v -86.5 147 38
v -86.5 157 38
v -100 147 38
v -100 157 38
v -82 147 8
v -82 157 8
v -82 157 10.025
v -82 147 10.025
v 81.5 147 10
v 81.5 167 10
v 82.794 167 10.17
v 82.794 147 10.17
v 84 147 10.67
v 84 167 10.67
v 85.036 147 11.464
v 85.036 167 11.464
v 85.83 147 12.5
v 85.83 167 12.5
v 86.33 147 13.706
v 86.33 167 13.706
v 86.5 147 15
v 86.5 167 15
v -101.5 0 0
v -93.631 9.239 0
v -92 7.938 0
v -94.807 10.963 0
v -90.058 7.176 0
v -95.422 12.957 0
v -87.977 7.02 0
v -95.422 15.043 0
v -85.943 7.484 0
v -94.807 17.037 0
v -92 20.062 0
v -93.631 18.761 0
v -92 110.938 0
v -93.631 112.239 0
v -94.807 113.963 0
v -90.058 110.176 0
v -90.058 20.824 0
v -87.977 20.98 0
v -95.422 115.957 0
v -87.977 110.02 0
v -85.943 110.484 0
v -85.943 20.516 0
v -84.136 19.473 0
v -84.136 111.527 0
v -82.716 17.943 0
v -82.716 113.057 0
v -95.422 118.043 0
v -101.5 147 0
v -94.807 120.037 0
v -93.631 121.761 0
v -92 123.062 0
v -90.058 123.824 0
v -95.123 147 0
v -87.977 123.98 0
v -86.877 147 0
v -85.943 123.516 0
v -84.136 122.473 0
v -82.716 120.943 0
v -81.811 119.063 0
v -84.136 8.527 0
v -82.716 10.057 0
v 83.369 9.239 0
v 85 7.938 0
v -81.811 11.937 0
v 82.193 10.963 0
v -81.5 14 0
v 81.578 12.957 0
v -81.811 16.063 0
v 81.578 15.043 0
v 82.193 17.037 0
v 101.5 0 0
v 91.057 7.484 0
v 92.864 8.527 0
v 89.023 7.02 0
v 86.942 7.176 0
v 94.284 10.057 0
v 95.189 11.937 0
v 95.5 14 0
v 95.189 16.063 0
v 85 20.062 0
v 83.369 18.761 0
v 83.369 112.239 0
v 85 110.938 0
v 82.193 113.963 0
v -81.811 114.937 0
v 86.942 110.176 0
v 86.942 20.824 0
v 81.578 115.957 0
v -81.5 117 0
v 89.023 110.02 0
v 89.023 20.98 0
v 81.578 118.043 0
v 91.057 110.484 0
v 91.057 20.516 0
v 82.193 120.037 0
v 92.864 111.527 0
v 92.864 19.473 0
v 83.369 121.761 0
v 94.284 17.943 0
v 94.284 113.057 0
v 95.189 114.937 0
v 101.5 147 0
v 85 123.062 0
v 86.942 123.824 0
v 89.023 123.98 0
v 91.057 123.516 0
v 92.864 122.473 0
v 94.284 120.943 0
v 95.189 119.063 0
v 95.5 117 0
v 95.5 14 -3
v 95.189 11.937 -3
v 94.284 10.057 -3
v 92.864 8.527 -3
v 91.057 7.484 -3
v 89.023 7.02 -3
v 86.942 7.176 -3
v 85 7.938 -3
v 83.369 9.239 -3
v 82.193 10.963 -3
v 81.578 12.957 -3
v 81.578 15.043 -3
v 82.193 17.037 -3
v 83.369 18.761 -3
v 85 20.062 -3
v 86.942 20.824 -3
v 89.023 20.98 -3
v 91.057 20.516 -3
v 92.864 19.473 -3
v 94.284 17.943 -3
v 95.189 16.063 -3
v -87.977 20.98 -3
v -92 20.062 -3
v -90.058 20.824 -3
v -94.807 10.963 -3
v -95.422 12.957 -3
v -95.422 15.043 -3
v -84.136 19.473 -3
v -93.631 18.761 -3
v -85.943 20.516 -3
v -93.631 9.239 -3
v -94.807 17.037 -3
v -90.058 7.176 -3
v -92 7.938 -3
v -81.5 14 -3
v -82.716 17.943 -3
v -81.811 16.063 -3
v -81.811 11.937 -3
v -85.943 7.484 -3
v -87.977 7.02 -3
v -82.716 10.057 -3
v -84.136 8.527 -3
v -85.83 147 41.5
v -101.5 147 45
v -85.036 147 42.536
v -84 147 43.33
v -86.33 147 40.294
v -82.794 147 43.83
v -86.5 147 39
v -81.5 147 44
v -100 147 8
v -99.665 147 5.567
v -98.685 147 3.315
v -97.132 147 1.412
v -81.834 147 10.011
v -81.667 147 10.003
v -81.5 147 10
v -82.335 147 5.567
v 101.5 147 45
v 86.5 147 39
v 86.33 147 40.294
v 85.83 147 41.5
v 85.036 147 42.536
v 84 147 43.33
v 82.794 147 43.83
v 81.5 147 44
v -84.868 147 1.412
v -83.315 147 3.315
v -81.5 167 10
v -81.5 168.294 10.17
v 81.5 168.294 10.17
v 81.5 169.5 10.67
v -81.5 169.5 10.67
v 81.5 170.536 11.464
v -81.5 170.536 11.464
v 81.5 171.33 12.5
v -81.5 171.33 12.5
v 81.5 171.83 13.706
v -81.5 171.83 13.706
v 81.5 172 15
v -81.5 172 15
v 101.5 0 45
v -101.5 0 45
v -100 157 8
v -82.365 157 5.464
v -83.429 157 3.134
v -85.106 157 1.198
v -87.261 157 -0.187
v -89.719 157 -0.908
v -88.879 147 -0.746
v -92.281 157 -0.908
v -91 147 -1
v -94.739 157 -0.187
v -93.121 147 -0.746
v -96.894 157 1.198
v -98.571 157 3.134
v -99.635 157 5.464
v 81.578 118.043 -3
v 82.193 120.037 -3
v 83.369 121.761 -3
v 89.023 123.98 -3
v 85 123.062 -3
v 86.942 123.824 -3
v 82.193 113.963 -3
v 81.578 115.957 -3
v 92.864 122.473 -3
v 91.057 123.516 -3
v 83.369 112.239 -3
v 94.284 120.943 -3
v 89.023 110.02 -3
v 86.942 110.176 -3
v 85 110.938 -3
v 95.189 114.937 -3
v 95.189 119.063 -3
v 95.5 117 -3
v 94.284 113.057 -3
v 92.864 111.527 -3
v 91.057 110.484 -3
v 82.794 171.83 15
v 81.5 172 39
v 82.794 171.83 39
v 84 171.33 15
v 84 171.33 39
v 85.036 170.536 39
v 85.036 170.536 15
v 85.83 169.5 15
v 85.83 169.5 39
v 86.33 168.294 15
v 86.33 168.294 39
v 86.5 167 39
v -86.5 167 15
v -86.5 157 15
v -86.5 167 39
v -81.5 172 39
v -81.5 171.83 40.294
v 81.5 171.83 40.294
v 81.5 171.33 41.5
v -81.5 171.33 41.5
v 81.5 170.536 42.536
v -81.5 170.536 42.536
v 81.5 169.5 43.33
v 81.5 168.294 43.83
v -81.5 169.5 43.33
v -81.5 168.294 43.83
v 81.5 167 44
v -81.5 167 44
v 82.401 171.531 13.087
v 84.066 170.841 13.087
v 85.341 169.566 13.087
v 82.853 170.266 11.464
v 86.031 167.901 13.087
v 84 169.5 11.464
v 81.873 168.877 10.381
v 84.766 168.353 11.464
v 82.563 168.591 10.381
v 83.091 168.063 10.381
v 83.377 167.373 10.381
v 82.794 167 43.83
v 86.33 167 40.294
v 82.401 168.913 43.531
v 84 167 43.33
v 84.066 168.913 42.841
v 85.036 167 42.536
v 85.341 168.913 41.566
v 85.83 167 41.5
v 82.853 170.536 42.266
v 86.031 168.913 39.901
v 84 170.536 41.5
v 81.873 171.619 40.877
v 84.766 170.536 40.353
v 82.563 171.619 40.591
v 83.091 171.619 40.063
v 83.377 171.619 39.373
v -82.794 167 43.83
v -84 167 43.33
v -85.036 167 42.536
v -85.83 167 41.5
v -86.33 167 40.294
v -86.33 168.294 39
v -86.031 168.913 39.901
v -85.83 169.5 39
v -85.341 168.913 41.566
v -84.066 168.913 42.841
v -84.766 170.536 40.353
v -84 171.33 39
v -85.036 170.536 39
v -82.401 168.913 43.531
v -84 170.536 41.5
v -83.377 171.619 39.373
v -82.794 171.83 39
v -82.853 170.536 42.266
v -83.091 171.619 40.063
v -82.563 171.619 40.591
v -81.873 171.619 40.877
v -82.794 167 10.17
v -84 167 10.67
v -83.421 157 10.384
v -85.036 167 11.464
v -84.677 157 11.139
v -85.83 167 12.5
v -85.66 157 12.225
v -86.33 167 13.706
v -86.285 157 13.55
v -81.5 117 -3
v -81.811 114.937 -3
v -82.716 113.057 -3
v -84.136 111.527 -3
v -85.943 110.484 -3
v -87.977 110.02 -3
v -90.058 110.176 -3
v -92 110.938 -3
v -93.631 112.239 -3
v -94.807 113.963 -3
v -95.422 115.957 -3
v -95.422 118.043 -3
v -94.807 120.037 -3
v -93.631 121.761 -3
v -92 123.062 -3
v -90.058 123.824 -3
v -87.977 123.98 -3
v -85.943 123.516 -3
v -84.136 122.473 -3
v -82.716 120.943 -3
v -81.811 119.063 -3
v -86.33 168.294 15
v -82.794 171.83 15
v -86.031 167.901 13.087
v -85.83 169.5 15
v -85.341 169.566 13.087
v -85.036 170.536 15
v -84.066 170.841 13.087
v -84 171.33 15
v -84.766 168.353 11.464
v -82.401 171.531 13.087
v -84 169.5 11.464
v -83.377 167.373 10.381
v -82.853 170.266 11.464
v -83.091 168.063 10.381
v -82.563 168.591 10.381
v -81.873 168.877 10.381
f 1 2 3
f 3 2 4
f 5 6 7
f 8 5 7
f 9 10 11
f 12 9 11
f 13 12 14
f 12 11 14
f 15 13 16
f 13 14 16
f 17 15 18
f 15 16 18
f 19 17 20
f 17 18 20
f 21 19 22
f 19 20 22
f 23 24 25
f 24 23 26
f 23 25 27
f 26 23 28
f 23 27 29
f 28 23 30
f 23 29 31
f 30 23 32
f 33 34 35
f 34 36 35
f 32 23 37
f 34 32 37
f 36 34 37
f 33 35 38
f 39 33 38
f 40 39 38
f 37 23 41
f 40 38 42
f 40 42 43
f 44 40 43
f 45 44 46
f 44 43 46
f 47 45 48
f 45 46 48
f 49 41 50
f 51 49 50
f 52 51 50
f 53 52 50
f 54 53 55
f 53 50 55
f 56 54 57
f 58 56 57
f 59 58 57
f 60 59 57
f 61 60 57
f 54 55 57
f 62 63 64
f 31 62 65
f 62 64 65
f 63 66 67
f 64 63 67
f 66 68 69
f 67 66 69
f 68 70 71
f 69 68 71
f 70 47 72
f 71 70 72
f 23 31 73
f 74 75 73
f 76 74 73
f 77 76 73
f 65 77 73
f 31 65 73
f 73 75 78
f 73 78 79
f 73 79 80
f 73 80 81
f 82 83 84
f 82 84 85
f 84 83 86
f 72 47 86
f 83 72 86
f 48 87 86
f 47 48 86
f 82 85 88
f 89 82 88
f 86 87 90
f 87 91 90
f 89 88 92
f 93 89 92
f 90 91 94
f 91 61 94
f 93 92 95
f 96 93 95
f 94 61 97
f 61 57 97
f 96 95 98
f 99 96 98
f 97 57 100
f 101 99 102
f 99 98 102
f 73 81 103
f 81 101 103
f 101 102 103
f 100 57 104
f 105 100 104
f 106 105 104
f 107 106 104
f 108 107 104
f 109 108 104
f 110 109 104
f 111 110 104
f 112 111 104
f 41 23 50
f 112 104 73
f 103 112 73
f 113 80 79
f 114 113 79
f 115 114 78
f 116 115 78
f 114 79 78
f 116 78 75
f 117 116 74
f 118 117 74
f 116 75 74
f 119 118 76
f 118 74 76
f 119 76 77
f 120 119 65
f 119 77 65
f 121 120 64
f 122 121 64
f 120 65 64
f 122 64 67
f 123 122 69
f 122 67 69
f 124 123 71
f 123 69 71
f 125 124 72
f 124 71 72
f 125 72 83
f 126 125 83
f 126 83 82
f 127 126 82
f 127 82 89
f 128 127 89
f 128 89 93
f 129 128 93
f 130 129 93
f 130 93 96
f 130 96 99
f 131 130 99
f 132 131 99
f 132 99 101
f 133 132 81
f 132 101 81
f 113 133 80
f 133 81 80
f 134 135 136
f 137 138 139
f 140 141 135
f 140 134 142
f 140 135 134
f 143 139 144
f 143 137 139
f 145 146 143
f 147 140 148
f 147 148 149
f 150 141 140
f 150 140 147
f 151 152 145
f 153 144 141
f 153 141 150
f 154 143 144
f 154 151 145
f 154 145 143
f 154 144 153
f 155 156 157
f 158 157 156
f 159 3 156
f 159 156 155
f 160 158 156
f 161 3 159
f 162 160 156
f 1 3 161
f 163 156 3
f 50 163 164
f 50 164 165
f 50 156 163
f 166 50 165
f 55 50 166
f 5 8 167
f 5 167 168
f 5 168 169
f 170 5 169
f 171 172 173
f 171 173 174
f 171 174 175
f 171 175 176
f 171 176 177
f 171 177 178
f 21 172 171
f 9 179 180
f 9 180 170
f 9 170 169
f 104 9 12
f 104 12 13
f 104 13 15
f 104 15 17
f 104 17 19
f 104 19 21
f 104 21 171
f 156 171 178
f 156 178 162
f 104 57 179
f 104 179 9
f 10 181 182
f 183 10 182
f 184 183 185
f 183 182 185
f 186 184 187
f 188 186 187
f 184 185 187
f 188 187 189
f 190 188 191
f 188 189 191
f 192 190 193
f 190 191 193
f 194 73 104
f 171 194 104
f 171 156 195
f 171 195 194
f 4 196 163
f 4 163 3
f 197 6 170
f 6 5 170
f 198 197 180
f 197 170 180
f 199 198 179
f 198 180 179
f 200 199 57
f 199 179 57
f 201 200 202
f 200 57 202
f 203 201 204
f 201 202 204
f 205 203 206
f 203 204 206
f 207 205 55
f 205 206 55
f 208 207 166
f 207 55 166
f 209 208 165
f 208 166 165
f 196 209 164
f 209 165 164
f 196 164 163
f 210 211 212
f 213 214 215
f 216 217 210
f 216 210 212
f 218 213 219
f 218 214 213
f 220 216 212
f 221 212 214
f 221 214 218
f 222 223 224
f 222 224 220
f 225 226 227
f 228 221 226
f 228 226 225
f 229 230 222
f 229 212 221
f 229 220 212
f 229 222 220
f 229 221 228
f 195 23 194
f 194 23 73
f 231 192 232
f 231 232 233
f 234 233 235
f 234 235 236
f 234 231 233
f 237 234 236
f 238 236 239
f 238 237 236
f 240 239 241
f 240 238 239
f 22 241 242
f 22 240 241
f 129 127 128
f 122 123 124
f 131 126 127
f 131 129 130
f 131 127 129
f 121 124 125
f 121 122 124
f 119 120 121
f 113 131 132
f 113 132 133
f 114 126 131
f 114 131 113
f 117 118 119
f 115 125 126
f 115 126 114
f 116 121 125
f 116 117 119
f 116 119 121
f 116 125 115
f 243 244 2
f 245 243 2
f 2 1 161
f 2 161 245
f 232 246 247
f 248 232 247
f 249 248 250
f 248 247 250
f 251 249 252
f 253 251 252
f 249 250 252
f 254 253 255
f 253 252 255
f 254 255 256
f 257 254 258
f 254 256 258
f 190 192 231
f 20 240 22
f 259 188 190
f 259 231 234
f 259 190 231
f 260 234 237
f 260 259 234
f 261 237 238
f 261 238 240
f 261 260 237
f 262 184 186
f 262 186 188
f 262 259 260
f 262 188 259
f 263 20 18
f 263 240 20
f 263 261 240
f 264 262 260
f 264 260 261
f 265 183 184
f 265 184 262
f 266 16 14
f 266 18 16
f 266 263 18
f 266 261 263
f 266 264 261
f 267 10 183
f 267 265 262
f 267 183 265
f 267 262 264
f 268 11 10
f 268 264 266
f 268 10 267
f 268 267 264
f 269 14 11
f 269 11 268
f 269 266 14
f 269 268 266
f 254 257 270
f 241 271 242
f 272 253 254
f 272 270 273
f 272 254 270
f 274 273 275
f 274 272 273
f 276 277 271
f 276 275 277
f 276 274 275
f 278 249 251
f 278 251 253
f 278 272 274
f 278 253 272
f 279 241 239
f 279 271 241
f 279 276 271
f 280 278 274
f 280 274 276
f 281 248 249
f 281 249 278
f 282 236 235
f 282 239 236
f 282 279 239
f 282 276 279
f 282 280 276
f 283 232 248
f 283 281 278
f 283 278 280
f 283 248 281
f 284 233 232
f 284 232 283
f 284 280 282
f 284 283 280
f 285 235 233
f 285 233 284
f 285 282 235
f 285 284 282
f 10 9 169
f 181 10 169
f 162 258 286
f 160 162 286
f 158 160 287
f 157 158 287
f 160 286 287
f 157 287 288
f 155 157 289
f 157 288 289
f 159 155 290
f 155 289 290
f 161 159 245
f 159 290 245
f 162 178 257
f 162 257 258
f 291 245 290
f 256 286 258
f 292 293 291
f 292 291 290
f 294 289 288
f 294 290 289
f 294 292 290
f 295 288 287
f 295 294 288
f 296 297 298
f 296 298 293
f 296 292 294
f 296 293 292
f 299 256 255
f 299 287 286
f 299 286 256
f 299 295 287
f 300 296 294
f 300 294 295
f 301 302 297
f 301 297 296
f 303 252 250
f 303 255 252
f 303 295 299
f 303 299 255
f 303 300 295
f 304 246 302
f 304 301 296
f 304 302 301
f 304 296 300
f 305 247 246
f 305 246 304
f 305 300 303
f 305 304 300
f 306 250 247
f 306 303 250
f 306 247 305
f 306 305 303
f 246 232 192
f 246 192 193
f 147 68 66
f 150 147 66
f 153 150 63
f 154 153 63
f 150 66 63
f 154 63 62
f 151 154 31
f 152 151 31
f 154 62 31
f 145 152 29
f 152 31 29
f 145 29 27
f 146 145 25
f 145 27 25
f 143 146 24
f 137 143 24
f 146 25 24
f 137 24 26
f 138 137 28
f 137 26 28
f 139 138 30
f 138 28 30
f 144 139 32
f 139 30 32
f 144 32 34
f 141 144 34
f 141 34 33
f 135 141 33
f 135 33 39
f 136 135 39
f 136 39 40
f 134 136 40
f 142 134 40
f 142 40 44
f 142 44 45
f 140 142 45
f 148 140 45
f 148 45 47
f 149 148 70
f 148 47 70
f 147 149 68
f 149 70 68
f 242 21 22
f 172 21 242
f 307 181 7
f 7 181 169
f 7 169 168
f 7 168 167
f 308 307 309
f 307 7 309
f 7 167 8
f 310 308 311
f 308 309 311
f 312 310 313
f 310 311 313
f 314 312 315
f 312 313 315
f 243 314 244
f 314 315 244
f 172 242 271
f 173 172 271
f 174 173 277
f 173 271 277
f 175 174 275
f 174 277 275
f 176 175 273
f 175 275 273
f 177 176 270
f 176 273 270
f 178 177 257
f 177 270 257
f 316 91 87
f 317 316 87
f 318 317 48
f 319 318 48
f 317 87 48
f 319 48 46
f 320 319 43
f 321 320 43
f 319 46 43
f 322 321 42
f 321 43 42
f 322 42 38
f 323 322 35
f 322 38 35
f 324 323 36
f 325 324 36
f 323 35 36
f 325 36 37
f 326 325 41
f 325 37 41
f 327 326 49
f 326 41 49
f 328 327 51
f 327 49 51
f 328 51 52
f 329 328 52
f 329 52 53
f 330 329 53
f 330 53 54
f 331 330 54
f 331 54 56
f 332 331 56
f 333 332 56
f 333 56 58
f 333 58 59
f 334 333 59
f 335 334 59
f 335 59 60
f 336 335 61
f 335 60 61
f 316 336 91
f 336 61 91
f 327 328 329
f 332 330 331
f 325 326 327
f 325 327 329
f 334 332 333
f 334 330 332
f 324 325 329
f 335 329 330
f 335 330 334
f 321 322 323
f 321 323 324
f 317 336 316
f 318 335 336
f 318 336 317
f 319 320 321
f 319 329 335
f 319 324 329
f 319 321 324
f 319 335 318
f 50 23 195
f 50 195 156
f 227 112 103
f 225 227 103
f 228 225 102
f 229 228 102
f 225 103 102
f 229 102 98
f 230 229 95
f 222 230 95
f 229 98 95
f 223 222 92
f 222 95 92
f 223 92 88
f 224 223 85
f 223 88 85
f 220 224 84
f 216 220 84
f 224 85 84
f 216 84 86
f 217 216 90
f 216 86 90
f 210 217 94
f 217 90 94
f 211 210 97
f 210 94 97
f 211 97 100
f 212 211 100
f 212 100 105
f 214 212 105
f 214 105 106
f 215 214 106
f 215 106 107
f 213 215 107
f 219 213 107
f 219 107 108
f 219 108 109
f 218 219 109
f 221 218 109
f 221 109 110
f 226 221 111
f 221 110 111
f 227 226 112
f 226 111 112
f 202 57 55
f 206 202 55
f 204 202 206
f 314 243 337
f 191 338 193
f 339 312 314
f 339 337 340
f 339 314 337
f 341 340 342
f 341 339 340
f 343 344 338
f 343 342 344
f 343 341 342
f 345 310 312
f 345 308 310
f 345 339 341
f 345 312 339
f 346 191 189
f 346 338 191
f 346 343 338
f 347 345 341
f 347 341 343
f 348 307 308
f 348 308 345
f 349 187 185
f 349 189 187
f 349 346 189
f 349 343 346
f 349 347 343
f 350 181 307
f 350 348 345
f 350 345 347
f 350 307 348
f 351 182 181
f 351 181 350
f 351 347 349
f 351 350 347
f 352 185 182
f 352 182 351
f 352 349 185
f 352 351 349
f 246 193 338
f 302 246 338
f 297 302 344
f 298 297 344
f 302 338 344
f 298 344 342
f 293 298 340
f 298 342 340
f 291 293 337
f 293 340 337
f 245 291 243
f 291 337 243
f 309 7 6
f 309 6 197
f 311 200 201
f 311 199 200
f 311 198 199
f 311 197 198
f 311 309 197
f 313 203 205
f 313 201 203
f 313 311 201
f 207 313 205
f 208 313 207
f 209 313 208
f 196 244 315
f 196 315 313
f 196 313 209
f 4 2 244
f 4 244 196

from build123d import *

# Parameters (mm, degrees)
F0_W         = 203
F0_H         = 147
F1_DEPTH     = 45
F2_R         = 7
F3_DEPTH     = 3
F4_R         = 9
F5_DEPTH     = 10
F6_W         = 173
F6_H         = 34
F7_DEPTH     = 25
F8_T1_DEPTH  = 163
F8_T3_DEPTH  = 24
F8_T5_DEPTH  = 20
F8_S9_W      = 5
F8_S9_H      = 5
F8_T10_DEPTH = 5
F8_S15_W     = 5
F8_S15_H     = 5
F8_T16_DEPTH = 5
F8_S21_W     = 5
F8_S21_H     = 5
F8_T22_DEPTH = 5
F8_S27_W     = 5
F8_S27_H     = 5
F8_T28_DEPTH = 5
F8_T34_DEPTH = 22.5
F8_S36_R     = 9
F8_T37_DEPTH = 13
F8_T42_DEPTH = 10
F8_S43_R     = 9
F8_T44_DEPTH = 8
F8_T48_DEPTH = 10
F8_S49_R     = 9
F8_T50_DEPTH = 8
F9_W         = 18
F9_H         = 30
F10_DEPTH    = 10


# Not quite as in the source:
# - a fillet or chamfer that OpenCascade refuses, or shapes differently, is made with other operations: its cross-section is extruded or revolved along the edge and cut away or added


with BuildPart() as f1:
    # F0 (on Top) → F1 (new body)
    with BuildSketch(Plane.XY):
        with Locations((0, 73.5)):
            Rectangle(F0_W, F0_H)
    extrude(amount=F1_DEPTH)

    # F2 (on face) → F3 (join)
    with BuildSketch(Plane(origin=(0, 0, 0), x_dir=(1, 0, 0), z_dir=(0, 0, -1))):
        with Locations((-88.5, -14)):
            Circle(F2_R)
        with Locations((-88.5, -117)):
            Circle(F2_R)
        with Locations((88.5, -14)):
            Circle(F2_R)
        with Locations((88.5, -117)):
            Circle(F2_R)
    extrude(amount=F3_DEPTH)

    # F4 (on face) → F5 (join)
    with BuildSketch(Plane(origin=(0, 147, 0), x_dir=(-1, 0, 0), z_dir=(0, 1, 0))):
        with Locations((91, 8)):
            Circle(F4_R)
    extrude(amount=F5_DEPTH)

    # F6 (on face) → F7 (join)
    with BuildSketch(Plane(origin=(0, 147, 0), x_dir=(-1, 0, 0), z_dir=(0, 1, 0))):
        with Locations((0, 27)):
            Rectangle(F6_W, F6_H)
    extrude(amount=F7_DEPTH)

    # F8: fillet of radius 5 on 8 edges, made by hand

    # F8_s2 → F8_t1 (cut)
    with BuildSketch(Plane.YZ.offset(-81.5)):
        with BuildLine():
            ThreePointArc((172, 39), (170.5355339059, 42.5355339059), (167, 44))
            Line((167, 44), (172, 44))
            Line((172, 44), (172, 39))
        make_face()
        with BuildLine():
            ThreePointArc((167, 10), (170.5355339059, 11.4644660941), (172, 15))
            Line((172, 15), (172, 10))
            Line((172, 10), (167, 10))
        make_face()
    extrude(amount=F8_T1_DEPTH, mode=Mode.SUBTRACT)

    # F8_s4 → F8_t3 (cut)
    with BuildSketch(Plane.XY.offset(15)):
        with BuildLine():
            ThreePointArc((81.5, 172), (85.0355339059, 170.5355339059), (86.5, 167))
            Line((86.5, 167), (86.5, 172))
            Line((86.5, 172), (81.5, 172))
        make_face()
        with BuildLine():
            ThreePointArc((-81.5, 172), (-85.0355339059, 170.5355339059), (-86.5, 167))
            Line((-86.5, 167), (-86.5, 172))
            Line((-86.5, 172), (-81.5, 172))
        make_face()
    extrude(amount=F8_T3_DEPTH, mode=Mode.SUBTRACT)

    # F8_s6 → F8_t5 (cut)
    with BuildSketch(Plane.XZ.offset(-167)):
        with BuildLine():
            ThreePointArc((86.5, 39), (85.0355339059, 42.5355339059), (81.5, 44))
            Line((81.5, 44), (86.5, 44))
            Line((86.5, 44), (86.5, 39))
        make_face()
        with BuildLine():
            ThreePointArc((81.5, 10), (85.0355339059, 11.4644660941), (86.5, 15))
            Line((86.5, 15), (86.5, 10))
            Line((86.5, 10), (81.5, 10))
        make_face()
        with BuildLine():
            ThreePointArc((-81.5, 44), (-85.0355339059, 42.5355339059), (-86.5, 39))
            Line((-86.5, 39), (-86.5, 44))
            Line((-86.5, 44), (-81.5, 44))
        make_face()
    extrude(amount=F8_T5_DEPTH, mode=Mode.SUBTRACT)


with BuildPart() as f8_tool8:
    # F8_s9 → F8_t10 (new body)
    with BuildSketch(Plane.XZ.offset(-167)):
        with Locations((-84, 41.5)):
            Rectangle(F8_S9_W, F8_S9_H)
    extrude(amount=-F8_T10_DEPTH)

    # F8_s11 → F8_t12 (revolve, cut)
    with BuildSketch(Plane(origin=(-81.5, 167, 39), x_dir=(0.7071067812, 0, -0.7071067812), z_dir=(0.7071067812, 0, 0.7071067812))):
        with BuildLine():
            ThreePointArc((0, -5), (5, 0), (0, 5))
            Line((0, 5), (0, -5))
        make_face()
    revolve(axis=Axis((-81.5, 167, 39), (0, 1, 0)), mode=Mode.SUBTRACT)


with BuildPart() as f1_1:
    add(f1.part)

    # F8_t7: cut F8_tool8
    add(f8_tool8.part, mode=Mode.SUBTRACT)


with BuildPart() as f8_tool14:
    # F8_s15 → F8_t16 (new body)
    with BuildSketch(Plane.XZ.offset(-167)):
        with Locations((84, 41.5)):
            Rectangle(F8_S15_W, F8_S15_H)
    extrude(amount=-F8_T16_DEPTH)

    # F8_s17 → F8_t18 (revolve, cut)
    with BuildSketch(Plane(origin=(81.5, 167, 39), x_dir=(-0.7071067812, 0, -0.7071067812), z_dir=(0.7071067812, 0, -0.7071067812))):
        with BuildLine():
            ThreePointArc((0, -5), (5, 0), (0, 5))
            Line((0, 5), (0, -5))
        make_face()
    revolve(axis=Axis((81.5, 167, 39), (0, 1, 0)), mode=Mode.SUBTRACT)


with BuildPart() as f1_2:
    add(f1_1.part)

    # F8_t13: cut F8_tool14
    add(f8_tool14.part, mode=Mode.SUBTRACT)


with BuildPart() as f8_tool20:
    # F8_s21 → F8_t22 (new body)
    with BuildSketch(Plane.XY.offset(15)):
        with Locations((84, 169.5)):
            Rectangle(F8_S21_W, F8_S21_H)
    extrude(amount=-F8_T22_DEPTH)

    # F8_s23 → F8_t24 (revolve, cut)
    with BuildSketch(Plane(origin=(81.5, 167, 15), x_dir=(-0.7071067812, -0.7071067812, 0), z_dir=(0.7071067812, -0.7071067812, 0))):
        with BuildLine():
            ThreePointArc((0, -5), (5, 0), (0, 5))
            Line((0, 5), (0, -5))
        make_face()
    revolve(axis=Axis((81.5, 167, 15), (0, 0, -1)), mode=Mode.SUBTRACT)


with BuildPart() as f1_3:
    add(f1_2.part)

    # F8_t19: cut F8_tool20
    add(f8_tool20.part, mode=Mode.SUBTRACT)


with BuildPart() as f8_tool26:
    # F8_s27 → F8_t28 (new body)
    with BuildSketch(Plane.XY.offset(15)):
        with Locations((-84, 169.5)):
            Rectangle(F8_S27_W, F8_S27_H)
    extrude(amount=-F8_T28_DEPTH)

    # F8_s29 → F8_t30 (revolve, cut)
    with BuildSketch(Plane(origin=(-81.5, 167, 15), x_dir=(0.7071067812, -0.7071067812, 0), z_dir=(0.7071067812, 0.7071067812, 0))):
        with BuildLine():
            ThreePointArc((0, -5), (5, 0), (0, 5))
            Line((0, 5), (0, -5))
        make_face()
    revolve(axis=Axis((-81.5, 167, 15), (0, 0, -1)), mode=Mode.SUBTRACT)


with BuildPart() as f1_4:
    add(f1_3.part)

    # F8_t25: cut F8_tool26
    add(f8_tool26.part, mode=Mode.SUBTRACT)


with BuildPart() as f8_tool32:
    # F8_s33 → F8_t34 (new body)
    with BuildSketch(Plane.XZ.offset(-144.5)):
        with BuildLine():
            ThreePointArc((-81.5, 10), (-85.0355339059, 11.4644660941), (-86.5, 15))
            Line((-86.5, 15), (-86.5, 10))
            Line((-86.5, 10), (-81.5, 10))
        make_face()
    extrude(amount=-F8_T34_DEPTH)

    split(bisect_by=Plane.XZ.offset(-147), keep=Keep.BOTTOM)

    # F8_s36 → F8_t37 (cut, symmetric)
    with BuildSketch(Plane.XZ.offset(-155.8)):
        with Locations((-91, 8)):
            Circle(F8_S36_R)
    extrude(amount=F8_T37_DEPTH, both=True, mode=Mode.SUBTRACT)

    split(bisect_by=Plane.XZ.offset(-157), keep=Keep.TOP)


with BuildPart() as f1_5:
    add(f1_4.part)

    # F8_t31: cut F8_tool32
    add(f8_tool32.part, mode=Mode.SUBTRACT)


with BuildPart() as f8_tool40:
    # F8_s41 → F8_t42 (new body)
    with BuildSketch(Plane.XZ.offset(-157)):
        with BuildLine():
            ThreePointArc((-81.5, 10), (-85.0355339059, 11.4644660941), (-86.5, 15))
            Line((-86.5, 15), (-86.5, 10))
            Line((-86.5, 10), (-81.5, 10))
        make_face()
    extrude(amount=-F8_T42_DEPTH)

    # F8_s43 → F8_t44 (cut, symmetric)
    with BuildSketch(Plane.XZ.offset(-162)):
        with Locations((-91, 8)):
            Circle(F8_S43_R)
    extrude(amount=F8_T44_DEPTH, both=True, mode=Mode.SUBTRACT)


with BuildPart() as f1_6:
    add(f1_5.part)

    # F8_t39: cut F8_tool40
    add(f8_tool40.part, mode=Mode.SUBTRACT)


with BuildPart() as f8_tool46:
    # F8_s47 → F8_t48 (new body)
    with BuildSketch(Plane.XZ.offset(-157)):
        with BuildLine():
            ThreePointArc((-81.5, 10), (-85.0355339059, 11.4644660941), (-86.5, 15))
            Line((-86.5, 15), (-86.5, 10))
            Line((-86.5, 10), (-81.5, 10))
        make_face()
    extrude(amount=-F8_T48_DEPTH)

    # F8_s49 → F8_t50 (intersect, symmetric)
    with BuildSketch(Plane.XZ.offset(-162)):
        with Locations((-91, 8)):
            Circle(F8_S49_R)
    extrude(amount=F8_T50_DEPTH, both=True, mode=Mode.INTERSECT)


with BuildPart() as f1_7:
    add(f1_6.part)

    # F8_t45: cut F8_tool46
    add(f8_tool46.part, mode=Mode.SUBTRACT)

    # F9 (on face) → F10 (join, through all)
    with BuildSketch(Plane(origin=(0, 157, 0), x_dir=(-1, 0, 0), z_dir=(0, 1, 0))):
        with Locations((91, 23)):
            Rectangle(F9_W, F9_H)
    extrude(amount=-F10_DEPTH)


solid = f1_7.part
